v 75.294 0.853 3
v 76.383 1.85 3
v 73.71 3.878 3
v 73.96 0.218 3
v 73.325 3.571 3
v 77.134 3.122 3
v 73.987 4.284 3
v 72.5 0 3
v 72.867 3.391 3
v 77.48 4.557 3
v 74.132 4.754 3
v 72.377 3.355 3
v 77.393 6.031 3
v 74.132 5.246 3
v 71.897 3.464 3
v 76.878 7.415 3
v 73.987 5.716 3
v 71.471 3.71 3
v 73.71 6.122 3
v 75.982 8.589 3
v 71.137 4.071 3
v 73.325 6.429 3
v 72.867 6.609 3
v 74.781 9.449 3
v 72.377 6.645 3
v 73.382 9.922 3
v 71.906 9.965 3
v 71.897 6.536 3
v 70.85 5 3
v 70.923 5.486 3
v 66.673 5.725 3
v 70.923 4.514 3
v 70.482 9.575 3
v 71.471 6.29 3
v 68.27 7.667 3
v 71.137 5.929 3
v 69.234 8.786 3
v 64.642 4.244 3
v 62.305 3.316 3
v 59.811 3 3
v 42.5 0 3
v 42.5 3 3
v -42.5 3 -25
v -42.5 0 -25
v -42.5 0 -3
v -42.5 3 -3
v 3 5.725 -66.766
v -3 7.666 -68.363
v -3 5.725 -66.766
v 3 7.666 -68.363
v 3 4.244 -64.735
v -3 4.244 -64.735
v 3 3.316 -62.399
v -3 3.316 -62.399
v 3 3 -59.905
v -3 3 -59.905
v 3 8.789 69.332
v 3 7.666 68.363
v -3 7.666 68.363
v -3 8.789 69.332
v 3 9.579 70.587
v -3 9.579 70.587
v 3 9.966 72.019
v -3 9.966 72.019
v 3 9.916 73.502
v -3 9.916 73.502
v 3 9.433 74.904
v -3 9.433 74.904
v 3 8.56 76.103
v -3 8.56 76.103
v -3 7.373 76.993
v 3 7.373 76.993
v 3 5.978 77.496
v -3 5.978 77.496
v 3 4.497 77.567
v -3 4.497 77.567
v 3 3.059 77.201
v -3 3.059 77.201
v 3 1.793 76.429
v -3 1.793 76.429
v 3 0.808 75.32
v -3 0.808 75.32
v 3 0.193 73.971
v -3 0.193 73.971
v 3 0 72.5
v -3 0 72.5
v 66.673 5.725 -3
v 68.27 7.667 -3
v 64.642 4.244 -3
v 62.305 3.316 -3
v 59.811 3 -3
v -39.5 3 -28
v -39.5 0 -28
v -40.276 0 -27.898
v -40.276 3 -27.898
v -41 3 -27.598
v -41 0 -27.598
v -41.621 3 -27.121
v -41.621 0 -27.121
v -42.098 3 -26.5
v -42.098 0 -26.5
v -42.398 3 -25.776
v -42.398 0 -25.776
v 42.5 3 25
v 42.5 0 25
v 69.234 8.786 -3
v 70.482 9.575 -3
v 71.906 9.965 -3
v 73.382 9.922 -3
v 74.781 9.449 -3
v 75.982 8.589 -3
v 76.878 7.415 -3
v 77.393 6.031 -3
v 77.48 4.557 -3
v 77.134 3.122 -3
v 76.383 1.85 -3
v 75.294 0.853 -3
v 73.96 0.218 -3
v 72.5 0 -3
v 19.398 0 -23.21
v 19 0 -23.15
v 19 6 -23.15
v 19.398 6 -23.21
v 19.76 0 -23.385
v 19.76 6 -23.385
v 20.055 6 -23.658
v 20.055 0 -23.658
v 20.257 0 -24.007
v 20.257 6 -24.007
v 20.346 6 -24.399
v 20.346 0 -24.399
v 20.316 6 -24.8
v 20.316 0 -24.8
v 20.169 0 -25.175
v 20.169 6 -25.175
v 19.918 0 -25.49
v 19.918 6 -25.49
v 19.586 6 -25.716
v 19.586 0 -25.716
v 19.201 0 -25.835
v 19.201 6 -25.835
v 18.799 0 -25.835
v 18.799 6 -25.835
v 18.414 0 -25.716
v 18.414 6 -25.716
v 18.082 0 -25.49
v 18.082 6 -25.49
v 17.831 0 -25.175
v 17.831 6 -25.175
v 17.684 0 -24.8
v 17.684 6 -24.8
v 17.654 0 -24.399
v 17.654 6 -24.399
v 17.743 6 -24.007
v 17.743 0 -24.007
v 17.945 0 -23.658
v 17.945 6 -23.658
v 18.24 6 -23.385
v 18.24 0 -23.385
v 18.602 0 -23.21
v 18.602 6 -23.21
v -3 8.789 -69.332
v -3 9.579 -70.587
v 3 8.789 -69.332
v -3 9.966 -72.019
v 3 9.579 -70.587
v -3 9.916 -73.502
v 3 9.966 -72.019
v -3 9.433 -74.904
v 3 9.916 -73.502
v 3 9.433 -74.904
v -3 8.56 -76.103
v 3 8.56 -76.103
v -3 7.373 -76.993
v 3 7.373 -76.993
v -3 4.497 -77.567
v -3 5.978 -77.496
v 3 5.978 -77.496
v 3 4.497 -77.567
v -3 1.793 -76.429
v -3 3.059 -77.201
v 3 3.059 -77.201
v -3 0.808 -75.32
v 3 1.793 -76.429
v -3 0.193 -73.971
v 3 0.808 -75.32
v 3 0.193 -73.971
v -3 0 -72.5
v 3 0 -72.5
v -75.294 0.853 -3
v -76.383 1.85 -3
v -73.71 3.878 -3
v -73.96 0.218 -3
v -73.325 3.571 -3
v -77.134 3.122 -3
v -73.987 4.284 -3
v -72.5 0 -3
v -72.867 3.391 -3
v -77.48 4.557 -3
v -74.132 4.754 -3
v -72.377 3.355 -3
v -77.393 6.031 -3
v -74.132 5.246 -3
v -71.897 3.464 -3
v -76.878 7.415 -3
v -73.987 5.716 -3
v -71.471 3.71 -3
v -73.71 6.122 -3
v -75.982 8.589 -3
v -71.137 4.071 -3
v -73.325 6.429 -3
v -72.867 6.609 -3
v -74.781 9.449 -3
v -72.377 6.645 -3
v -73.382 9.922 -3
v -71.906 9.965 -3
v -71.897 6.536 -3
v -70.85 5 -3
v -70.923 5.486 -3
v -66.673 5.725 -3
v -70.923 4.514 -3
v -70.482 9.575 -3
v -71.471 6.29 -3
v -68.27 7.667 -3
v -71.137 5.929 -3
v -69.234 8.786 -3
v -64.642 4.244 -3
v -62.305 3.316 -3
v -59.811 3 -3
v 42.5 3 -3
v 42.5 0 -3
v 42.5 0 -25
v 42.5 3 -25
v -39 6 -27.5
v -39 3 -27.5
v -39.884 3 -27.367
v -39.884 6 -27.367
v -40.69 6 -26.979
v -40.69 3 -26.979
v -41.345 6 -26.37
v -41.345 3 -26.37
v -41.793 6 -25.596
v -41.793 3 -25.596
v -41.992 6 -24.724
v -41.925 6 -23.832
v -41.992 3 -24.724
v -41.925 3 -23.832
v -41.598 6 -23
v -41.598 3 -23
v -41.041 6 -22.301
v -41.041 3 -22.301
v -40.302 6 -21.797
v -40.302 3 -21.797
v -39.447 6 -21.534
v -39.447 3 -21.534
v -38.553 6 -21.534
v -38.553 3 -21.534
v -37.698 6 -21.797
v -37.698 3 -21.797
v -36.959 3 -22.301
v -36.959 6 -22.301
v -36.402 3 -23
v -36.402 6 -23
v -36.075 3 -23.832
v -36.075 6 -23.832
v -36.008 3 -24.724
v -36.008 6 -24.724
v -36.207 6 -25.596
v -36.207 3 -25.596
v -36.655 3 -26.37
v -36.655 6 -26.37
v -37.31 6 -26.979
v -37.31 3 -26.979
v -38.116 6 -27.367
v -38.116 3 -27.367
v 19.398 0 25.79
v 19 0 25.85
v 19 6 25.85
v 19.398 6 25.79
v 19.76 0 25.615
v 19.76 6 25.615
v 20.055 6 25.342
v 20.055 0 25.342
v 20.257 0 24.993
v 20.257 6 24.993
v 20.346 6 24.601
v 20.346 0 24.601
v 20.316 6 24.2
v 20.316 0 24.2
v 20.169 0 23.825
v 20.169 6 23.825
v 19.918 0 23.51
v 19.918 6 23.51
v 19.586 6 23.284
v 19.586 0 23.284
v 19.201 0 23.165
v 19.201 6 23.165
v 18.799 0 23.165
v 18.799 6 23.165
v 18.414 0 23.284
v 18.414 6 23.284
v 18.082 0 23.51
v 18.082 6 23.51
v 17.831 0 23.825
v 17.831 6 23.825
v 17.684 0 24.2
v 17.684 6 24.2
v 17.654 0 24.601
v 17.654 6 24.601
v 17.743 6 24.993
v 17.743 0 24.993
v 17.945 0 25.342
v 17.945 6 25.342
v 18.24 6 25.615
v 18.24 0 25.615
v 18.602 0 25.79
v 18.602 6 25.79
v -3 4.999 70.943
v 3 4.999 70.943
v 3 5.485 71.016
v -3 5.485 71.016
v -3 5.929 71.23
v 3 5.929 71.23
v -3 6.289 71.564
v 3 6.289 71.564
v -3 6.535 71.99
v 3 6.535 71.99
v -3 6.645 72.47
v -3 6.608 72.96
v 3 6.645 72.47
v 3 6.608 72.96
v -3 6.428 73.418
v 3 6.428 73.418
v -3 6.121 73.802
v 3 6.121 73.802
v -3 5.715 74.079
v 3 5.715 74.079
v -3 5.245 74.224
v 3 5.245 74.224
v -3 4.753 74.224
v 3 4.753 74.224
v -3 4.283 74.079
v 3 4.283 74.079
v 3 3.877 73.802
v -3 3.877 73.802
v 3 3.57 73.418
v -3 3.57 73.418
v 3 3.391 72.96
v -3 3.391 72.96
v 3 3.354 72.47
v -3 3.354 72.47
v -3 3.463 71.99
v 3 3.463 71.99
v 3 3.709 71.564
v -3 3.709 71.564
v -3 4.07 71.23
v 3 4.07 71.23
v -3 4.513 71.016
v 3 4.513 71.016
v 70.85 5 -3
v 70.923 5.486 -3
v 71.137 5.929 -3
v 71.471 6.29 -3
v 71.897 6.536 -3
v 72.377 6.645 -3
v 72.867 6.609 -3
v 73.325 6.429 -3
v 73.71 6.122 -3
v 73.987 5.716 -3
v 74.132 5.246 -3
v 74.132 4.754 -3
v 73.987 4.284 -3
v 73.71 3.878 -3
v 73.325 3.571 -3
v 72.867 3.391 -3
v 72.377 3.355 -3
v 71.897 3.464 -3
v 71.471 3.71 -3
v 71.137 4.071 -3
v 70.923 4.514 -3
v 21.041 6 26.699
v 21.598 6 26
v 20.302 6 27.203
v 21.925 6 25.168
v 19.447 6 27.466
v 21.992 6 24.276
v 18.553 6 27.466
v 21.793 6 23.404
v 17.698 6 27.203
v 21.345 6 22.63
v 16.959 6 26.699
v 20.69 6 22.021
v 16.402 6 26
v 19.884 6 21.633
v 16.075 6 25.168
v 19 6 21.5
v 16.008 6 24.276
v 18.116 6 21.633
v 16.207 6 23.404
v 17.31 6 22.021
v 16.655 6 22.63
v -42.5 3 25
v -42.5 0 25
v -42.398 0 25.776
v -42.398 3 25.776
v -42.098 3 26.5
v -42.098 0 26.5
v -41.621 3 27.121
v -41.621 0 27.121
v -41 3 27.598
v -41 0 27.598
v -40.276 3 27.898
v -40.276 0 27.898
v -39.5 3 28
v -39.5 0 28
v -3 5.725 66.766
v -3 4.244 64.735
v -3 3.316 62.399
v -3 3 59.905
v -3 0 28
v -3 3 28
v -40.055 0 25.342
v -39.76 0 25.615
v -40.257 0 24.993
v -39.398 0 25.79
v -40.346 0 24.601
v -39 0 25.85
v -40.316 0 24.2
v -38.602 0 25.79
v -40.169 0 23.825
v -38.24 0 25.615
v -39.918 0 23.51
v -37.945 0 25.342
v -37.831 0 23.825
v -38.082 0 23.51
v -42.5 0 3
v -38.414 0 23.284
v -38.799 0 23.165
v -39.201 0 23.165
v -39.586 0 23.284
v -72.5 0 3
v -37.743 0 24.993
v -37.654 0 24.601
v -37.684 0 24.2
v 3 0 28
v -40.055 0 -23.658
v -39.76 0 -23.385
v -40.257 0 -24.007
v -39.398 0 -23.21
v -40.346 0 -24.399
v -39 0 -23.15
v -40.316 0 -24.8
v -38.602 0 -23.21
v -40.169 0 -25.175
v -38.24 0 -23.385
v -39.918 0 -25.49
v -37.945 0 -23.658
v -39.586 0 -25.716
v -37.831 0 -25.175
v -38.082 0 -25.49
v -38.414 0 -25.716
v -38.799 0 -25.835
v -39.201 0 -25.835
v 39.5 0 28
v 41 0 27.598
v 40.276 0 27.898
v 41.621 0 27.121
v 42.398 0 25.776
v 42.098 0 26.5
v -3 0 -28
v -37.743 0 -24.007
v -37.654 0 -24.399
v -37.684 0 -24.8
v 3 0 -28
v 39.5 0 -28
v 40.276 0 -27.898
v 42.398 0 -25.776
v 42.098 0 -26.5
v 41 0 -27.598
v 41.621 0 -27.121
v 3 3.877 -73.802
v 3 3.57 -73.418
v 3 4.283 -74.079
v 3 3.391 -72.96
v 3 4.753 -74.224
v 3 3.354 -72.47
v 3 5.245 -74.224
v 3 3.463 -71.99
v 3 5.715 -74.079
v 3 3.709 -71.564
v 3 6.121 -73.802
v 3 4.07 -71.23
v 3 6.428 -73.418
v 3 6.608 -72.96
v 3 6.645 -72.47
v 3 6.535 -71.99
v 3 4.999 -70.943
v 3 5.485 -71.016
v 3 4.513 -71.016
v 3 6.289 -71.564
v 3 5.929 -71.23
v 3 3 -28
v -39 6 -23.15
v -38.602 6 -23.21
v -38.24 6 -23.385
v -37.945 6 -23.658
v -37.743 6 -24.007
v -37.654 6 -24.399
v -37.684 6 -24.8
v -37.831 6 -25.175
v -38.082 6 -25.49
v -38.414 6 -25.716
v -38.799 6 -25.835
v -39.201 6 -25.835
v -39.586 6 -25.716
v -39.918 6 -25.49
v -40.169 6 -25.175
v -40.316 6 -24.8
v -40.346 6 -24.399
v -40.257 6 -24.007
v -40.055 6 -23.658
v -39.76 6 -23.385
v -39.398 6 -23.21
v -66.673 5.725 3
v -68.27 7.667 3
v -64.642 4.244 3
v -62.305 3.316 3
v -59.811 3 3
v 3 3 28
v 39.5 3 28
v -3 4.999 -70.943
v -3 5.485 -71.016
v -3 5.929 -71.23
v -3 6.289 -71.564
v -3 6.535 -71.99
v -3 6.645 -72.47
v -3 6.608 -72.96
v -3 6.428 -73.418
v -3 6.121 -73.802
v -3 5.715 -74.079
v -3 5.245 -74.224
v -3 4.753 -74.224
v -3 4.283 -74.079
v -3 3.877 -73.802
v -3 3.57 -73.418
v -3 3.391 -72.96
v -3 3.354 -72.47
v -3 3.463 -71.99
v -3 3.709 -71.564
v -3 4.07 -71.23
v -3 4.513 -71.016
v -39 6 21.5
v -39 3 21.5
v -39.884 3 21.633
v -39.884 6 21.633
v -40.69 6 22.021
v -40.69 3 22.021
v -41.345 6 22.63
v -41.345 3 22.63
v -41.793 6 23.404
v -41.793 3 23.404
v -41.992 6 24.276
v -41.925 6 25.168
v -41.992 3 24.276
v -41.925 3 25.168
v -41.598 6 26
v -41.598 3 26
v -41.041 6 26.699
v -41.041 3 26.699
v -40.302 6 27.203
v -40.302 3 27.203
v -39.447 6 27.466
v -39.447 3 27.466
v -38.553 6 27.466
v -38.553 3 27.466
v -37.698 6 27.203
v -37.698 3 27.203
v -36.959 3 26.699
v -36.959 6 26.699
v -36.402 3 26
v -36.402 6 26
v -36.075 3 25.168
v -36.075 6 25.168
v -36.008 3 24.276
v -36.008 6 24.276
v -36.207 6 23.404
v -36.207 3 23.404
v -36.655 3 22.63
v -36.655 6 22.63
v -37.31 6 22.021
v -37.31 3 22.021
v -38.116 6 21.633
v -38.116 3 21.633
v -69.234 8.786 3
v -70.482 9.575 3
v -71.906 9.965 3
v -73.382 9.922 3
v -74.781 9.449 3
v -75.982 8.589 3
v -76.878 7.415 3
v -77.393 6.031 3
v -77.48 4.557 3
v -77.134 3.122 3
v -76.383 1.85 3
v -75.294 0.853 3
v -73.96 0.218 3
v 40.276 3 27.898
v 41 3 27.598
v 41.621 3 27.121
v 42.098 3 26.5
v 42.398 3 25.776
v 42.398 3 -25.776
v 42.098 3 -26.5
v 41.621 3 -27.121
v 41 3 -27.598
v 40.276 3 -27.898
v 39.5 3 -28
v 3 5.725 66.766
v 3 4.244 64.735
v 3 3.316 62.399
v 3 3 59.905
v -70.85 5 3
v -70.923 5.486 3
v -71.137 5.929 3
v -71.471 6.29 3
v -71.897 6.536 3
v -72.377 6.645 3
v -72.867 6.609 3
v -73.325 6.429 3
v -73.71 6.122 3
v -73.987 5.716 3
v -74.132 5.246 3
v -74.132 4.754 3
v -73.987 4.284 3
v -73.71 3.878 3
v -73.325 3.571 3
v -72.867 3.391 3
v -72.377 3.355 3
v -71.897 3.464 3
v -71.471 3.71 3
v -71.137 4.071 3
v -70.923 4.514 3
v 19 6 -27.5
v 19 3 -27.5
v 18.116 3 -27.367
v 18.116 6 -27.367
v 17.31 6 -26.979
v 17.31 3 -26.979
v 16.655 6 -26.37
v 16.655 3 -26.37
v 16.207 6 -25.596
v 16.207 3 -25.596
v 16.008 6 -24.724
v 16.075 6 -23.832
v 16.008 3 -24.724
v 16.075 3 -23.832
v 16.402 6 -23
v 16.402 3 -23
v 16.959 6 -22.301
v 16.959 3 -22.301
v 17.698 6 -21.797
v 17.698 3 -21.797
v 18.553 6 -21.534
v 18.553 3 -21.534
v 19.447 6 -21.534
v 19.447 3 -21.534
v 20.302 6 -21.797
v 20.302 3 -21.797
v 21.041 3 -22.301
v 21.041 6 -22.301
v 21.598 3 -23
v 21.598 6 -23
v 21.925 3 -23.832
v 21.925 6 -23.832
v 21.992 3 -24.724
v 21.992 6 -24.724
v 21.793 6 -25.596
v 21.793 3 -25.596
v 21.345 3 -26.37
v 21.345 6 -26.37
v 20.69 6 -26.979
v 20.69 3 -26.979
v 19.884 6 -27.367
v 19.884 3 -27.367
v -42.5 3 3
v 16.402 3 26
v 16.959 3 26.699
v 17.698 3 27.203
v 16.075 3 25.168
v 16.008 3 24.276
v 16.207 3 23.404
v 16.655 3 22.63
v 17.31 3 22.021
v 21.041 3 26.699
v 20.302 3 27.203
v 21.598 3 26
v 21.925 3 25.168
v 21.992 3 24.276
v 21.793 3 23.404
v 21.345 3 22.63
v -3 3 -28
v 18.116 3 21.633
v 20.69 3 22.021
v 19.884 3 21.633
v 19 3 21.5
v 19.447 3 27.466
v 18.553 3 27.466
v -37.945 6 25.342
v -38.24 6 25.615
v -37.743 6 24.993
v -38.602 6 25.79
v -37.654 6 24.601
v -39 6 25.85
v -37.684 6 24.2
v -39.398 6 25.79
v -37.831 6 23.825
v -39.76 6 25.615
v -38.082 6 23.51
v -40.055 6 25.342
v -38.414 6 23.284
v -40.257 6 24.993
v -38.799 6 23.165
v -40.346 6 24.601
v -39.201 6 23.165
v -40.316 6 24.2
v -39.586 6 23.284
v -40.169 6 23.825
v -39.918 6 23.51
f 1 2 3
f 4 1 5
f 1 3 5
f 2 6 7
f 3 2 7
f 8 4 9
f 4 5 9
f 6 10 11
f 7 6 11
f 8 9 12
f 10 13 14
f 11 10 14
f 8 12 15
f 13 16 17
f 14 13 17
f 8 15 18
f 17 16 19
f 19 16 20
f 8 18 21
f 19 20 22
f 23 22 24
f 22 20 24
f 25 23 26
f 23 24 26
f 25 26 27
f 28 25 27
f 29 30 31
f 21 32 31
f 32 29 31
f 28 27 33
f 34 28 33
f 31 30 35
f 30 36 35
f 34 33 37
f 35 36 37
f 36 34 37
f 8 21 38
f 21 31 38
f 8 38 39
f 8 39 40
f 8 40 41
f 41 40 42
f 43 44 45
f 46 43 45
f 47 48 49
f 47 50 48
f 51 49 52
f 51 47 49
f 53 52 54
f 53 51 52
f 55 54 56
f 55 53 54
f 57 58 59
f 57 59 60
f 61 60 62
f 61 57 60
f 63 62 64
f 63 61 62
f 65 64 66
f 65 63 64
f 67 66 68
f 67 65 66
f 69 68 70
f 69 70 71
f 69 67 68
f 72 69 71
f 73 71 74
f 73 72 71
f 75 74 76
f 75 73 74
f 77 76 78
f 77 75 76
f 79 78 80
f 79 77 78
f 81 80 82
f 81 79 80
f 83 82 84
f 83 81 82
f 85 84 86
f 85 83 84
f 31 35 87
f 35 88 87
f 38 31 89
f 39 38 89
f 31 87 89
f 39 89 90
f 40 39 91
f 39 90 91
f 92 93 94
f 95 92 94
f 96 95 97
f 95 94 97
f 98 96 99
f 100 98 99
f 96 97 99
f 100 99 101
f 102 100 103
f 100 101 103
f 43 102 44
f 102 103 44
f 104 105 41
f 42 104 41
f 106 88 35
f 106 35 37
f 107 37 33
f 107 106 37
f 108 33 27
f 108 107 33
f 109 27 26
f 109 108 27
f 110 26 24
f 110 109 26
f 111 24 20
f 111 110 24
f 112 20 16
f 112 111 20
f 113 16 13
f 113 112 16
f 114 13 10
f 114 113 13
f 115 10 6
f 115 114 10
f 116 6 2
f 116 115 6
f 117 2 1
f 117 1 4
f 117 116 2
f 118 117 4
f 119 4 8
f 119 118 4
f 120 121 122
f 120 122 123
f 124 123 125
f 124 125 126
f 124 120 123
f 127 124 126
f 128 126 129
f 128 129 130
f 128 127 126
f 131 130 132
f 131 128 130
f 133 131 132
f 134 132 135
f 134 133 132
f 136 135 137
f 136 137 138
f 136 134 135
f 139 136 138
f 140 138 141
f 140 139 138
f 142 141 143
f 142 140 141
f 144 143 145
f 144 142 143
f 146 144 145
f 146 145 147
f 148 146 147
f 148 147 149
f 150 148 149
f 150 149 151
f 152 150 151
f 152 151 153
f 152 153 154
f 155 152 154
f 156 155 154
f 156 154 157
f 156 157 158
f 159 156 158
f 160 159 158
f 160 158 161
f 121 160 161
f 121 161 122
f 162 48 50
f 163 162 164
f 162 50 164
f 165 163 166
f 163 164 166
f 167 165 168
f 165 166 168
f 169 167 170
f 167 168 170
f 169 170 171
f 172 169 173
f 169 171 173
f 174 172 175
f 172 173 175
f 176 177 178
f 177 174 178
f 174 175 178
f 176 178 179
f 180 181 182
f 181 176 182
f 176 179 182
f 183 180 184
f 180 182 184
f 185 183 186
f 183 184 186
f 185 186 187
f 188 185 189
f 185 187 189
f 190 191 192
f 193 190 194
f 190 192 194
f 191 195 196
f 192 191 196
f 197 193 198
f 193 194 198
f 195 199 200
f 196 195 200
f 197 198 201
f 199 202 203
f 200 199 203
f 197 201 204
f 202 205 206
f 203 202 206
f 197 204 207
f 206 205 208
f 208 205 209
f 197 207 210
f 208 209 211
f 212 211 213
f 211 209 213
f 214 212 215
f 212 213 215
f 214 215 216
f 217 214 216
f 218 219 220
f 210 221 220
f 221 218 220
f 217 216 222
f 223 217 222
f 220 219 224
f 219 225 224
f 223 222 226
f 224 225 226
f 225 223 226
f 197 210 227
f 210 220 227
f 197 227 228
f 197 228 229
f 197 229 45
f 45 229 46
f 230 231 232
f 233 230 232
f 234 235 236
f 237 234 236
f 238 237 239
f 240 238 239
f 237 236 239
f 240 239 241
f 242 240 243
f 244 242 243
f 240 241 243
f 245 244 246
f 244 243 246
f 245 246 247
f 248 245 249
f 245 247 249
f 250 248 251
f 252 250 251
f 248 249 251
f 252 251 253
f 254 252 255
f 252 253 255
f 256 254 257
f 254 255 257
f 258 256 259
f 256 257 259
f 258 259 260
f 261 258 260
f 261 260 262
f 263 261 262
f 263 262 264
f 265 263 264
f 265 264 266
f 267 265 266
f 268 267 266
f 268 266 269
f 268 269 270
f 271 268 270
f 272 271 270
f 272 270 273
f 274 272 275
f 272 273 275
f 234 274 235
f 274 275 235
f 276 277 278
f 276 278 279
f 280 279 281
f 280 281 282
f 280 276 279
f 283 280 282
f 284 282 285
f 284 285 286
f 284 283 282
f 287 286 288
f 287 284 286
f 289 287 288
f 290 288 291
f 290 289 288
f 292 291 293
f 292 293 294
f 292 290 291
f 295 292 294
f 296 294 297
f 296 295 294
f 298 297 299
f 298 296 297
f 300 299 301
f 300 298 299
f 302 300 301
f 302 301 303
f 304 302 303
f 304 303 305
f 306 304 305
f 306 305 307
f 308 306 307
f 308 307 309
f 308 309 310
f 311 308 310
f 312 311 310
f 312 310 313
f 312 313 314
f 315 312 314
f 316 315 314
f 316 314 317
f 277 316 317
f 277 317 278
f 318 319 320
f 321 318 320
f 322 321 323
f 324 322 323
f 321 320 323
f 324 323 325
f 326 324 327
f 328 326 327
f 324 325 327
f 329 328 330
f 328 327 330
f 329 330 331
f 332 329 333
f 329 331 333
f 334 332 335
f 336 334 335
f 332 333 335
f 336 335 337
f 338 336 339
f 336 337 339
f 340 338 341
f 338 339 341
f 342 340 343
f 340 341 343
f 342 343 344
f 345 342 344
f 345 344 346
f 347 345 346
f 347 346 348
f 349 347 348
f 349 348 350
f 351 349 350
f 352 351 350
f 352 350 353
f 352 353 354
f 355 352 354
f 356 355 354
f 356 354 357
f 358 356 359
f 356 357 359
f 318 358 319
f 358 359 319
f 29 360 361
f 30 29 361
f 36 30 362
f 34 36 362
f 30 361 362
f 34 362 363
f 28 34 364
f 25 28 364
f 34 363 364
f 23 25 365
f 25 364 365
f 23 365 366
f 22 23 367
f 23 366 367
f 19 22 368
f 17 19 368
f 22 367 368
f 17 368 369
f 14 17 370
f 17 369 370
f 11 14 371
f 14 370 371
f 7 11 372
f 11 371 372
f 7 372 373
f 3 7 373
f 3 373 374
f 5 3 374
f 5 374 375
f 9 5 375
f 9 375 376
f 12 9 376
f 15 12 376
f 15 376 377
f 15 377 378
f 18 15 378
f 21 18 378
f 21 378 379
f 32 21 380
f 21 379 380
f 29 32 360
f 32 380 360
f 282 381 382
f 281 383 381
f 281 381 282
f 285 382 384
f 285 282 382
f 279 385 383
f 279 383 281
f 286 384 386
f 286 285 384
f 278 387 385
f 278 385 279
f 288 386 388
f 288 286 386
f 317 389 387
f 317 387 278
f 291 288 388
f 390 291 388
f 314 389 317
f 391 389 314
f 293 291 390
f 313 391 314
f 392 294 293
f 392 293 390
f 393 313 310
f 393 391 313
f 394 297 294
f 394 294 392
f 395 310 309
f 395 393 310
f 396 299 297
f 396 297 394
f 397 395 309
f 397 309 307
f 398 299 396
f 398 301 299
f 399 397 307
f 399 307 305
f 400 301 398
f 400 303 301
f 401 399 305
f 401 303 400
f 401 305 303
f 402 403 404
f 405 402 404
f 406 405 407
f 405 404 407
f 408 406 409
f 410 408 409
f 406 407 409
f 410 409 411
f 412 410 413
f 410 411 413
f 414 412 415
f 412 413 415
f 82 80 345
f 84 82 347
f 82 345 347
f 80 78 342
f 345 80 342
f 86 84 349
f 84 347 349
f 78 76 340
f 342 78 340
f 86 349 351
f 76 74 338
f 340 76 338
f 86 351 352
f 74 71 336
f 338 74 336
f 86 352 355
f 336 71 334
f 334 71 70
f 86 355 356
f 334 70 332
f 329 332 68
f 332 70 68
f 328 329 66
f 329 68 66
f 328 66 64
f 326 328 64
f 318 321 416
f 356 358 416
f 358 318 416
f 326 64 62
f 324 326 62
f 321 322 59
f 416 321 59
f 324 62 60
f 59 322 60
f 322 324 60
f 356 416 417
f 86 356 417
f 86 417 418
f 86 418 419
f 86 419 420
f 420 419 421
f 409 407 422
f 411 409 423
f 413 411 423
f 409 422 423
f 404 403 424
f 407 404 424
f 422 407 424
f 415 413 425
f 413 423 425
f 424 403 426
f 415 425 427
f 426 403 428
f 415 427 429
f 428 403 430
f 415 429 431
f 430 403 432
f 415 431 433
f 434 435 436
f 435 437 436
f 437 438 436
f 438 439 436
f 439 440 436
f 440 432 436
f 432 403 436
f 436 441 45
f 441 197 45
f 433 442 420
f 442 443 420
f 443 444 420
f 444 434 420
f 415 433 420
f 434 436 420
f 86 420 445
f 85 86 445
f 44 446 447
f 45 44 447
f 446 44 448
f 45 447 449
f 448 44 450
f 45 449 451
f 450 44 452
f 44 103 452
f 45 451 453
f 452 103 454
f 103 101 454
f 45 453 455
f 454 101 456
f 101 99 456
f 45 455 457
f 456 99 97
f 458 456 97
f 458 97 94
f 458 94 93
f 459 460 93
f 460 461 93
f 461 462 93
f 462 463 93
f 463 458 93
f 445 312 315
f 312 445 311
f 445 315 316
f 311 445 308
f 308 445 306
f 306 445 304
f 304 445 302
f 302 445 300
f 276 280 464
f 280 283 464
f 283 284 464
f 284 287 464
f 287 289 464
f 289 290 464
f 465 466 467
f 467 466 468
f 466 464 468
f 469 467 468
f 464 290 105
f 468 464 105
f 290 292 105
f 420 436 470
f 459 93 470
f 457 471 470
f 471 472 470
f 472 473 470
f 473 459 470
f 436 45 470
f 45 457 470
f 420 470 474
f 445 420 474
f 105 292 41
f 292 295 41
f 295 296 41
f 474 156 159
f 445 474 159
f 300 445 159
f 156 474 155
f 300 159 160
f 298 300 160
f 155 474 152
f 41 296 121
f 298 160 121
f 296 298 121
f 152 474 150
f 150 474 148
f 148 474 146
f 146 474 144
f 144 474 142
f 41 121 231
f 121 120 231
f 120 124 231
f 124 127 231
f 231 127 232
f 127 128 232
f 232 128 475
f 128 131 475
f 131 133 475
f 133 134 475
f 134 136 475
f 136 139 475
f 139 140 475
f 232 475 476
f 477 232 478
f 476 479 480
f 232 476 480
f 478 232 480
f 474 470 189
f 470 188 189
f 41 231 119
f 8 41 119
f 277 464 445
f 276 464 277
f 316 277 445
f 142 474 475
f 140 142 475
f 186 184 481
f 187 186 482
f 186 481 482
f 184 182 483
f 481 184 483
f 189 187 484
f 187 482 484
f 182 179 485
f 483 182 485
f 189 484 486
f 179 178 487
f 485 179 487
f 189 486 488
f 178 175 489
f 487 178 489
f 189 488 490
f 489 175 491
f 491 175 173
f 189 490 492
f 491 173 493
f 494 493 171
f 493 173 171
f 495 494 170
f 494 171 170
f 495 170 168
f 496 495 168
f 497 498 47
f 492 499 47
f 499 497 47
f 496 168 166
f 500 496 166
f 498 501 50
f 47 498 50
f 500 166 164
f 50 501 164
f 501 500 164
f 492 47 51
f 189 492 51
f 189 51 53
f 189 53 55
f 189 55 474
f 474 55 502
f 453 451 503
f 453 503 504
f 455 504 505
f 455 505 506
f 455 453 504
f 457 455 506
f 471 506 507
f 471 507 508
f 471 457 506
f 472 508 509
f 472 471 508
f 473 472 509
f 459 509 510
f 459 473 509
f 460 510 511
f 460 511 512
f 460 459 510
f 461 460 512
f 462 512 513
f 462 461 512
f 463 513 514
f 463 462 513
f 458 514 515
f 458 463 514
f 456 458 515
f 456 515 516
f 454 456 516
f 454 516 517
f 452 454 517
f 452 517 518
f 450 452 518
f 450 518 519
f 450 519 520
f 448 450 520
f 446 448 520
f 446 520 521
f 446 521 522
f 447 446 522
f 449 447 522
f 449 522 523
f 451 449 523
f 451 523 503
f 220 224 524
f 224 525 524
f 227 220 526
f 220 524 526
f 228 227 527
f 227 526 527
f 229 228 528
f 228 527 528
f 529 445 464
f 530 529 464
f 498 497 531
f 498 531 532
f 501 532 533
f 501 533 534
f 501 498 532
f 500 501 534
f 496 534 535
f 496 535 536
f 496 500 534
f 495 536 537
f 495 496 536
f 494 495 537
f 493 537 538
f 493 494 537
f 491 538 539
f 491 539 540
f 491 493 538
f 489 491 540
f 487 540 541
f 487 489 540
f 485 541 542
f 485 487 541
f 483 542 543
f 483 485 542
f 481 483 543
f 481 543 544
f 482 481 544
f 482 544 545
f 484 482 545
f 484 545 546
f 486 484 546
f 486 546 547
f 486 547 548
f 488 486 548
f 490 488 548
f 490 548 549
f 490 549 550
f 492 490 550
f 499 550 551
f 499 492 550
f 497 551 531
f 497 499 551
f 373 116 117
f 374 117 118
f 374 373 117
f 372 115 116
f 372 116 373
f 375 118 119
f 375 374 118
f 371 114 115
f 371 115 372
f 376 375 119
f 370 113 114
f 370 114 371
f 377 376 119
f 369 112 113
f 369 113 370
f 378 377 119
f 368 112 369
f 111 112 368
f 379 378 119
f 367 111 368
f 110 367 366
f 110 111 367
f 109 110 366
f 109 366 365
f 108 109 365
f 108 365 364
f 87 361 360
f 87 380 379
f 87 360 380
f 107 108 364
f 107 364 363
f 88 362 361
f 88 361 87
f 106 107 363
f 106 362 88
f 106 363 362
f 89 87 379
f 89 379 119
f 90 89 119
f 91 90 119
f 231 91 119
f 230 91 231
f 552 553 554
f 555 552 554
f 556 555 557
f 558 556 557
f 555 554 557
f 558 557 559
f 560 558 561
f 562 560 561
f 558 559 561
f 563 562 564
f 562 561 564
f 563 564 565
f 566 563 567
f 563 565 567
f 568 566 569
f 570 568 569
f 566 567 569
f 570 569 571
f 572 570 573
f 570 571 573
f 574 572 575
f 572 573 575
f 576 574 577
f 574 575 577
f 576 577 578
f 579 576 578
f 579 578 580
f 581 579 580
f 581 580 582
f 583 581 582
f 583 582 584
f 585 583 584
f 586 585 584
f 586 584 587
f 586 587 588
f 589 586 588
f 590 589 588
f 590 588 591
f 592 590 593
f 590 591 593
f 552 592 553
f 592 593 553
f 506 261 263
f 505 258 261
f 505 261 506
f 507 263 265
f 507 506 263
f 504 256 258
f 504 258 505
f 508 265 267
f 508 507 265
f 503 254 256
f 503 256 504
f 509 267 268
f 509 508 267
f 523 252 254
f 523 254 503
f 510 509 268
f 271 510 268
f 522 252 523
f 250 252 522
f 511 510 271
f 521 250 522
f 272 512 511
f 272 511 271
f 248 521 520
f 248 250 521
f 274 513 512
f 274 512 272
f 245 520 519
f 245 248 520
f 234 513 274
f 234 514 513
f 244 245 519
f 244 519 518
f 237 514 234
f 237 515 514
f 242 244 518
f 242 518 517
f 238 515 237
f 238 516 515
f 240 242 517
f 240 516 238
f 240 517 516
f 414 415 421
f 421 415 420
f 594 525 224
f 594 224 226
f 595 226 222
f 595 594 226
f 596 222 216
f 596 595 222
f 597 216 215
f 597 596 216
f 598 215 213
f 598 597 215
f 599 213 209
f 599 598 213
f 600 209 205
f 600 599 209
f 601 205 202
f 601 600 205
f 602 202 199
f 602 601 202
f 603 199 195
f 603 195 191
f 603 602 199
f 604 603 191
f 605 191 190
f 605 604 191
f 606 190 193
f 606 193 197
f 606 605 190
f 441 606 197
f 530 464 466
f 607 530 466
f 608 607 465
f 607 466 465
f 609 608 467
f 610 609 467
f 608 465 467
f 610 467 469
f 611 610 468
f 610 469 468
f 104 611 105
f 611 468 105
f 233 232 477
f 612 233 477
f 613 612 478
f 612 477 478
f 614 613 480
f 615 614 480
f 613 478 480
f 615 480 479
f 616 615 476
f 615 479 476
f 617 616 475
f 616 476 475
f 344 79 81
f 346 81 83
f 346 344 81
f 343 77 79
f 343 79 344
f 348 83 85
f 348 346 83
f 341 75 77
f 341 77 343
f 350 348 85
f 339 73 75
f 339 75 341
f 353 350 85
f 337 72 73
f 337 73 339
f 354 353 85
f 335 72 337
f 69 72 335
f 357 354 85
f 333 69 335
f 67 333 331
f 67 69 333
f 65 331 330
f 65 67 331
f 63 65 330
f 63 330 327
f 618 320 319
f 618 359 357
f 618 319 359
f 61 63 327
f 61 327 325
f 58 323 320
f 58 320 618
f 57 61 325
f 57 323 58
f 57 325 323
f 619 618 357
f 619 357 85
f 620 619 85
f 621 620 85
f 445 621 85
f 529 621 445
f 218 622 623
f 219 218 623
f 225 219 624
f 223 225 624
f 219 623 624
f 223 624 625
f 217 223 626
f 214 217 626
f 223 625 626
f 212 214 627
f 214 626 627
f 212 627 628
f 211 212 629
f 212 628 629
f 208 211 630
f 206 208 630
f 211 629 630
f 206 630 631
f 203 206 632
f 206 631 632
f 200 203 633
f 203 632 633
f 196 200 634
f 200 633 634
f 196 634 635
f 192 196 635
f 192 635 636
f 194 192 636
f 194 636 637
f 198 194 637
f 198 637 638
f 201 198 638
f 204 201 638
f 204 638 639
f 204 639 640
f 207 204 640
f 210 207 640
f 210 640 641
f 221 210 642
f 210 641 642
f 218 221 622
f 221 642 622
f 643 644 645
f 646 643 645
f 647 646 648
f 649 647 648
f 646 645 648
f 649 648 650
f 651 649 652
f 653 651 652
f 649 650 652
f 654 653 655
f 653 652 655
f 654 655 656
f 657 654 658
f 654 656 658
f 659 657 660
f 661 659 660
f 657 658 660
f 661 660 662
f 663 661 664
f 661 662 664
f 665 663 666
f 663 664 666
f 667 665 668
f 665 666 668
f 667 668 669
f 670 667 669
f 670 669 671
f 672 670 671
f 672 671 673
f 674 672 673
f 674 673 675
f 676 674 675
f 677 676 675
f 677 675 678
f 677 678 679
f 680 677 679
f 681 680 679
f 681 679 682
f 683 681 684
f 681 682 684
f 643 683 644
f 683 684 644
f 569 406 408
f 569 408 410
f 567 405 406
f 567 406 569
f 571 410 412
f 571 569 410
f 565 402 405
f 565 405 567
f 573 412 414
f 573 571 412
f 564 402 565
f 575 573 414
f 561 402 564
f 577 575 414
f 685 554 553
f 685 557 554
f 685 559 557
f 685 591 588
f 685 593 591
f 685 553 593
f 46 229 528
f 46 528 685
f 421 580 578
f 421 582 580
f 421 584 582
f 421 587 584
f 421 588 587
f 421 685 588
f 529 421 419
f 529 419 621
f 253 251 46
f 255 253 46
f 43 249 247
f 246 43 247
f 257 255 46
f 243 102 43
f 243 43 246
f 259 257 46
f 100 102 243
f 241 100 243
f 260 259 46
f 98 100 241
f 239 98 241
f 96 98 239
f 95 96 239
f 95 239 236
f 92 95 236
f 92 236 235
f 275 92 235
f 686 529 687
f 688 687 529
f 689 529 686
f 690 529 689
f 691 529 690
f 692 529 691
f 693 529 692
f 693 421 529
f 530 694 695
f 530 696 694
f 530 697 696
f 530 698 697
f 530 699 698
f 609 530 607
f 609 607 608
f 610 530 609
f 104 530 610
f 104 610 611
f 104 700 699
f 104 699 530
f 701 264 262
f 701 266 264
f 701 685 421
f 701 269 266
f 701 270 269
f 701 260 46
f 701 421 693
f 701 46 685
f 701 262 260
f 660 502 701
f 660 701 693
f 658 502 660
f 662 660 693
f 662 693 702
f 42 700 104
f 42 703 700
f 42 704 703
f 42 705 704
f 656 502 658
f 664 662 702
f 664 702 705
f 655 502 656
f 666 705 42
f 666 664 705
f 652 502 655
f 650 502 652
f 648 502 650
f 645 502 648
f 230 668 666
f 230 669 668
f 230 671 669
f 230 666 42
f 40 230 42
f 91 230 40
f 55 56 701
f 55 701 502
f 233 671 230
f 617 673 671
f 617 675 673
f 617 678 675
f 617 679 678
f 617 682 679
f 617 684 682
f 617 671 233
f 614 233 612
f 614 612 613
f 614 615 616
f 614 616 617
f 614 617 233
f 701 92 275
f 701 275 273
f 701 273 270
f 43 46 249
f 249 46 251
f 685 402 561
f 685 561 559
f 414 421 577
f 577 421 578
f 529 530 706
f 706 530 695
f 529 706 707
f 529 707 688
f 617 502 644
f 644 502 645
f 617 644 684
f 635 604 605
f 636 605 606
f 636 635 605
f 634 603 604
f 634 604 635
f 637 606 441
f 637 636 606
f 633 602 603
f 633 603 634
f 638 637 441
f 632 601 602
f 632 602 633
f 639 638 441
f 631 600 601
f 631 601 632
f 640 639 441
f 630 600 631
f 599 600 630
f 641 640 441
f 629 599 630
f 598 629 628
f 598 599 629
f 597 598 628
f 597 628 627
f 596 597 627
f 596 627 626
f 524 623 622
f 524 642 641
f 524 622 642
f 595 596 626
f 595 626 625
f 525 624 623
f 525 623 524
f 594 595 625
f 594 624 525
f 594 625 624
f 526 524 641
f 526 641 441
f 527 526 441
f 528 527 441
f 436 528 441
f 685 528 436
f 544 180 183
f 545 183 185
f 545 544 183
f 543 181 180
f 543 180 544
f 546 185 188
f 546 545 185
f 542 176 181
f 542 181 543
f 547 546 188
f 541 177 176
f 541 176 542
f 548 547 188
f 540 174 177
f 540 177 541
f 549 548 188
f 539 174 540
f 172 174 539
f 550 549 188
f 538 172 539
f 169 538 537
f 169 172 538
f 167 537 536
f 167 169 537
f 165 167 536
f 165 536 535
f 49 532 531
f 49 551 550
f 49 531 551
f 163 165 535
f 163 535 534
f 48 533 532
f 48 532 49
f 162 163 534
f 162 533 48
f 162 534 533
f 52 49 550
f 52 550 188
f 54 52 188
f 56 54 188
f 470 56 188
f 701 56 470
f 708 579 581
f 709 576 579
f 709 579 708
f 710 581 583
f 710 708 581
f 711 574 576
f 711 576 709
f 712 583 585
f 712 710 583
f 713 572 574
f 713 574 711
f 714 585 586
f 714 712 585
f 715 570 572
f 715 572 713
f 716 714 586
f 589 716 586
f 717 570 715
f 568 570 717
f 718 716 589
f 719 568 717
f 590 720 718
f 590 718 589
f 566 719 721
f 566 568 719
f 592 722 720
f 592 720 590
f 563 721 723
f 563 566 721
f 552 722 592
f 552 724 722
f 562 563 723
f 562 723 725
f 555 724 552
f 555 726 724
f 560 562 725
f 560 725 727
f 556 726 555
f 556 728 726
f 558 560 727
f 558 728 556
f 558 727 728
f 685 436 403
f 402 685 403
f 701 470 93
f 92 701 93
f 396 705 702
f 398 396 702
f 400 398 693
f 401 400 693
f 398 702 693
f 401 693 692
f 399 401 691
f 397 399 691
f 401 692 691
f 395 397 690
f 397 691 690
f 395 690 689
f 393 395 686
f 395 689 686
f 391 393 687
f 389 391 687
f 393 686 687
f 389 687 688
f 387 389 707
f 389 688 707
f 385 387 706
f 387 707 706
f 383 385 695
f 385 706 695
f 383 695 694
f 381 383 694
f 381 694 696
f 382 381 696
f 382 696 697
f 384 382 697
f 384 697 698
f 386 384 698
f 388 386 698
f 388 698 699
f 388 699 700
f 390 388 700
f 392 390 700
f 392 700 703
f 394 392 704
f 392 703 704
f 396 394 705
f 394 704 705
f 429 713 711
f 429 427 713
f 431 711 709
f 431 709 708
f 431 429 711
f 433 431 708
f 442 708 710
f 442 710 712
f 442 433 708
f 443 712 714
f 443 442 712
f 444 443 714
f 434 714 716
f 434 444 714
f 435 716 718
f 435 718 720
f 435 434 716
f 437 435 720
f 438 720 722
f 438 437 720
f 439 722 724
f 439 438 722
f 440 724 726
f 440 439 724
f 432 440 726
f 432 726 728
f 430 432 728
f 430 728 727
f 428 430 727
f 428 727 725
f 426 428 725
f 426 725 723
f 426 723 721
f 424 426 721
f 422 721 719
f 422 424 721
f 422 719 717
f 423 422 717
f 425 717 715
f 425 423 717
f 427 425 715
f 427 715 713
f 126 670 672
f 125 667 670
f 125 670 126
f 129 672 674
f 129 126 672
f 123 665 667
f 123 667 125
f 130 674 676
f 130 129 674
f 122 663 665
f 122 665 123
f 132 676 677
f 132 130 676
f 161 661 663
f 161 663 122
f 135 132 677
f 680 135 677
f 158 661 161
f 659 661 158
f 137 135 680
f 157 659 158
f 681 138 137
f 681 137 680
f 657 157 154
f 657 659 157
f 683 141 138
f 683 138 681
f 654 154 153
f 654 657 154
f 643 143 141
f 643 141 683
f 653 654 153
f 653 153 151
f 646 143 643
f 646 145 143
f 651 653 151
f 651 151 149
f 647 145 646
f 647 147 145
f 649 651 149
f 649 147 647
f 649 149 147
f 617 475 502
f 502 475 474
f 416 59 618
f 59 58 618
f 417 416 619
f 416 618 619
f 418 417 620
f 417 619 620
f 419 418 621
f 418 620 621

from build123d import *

# Parameters (mm, degrees)
SKETCH1_R                = 1.35
BOSS_EXTRUDE1_DEPTH      = 3
BOSS_EXTRUDE3_DEPTH      = 3
SKETCH2_R                = 3
SKETCH2_R_2              = 1.35
BOSS_EXTRUDE2_DEPTH      = 3
SKETCH4_R                = 5
SKETCH4_R_2              = 1.65
BOSS_EXTRUDE4_DEPTH      = 6
FILLET1_R                = 10
SKETCH6_R                = 5
SKETCH6_R_2              = 1.65
BOSS_EXTRUDE5_DEPTH      = 6
FILLET2_R                = 10
CIRPATTERN4_COUNT        = 2
FILLET1_OF_CIRPATTERN4_R = 10
FILLET2_OF_MIRROR1_R     = 10


with BuildPart() as part:
    # Sketch1 → Boss-Extrude1 (new body)
    with BuildSketch(Plane(origin=(0, 0, 0), x_dir=(1, 0, 0), z_dir=(0, 1, 0))):
        with BuildLine():
            Line((-39.5, -28), (39.5, -28))
            ThreePointArc((39.5, -28), (41.621320344, -27.121320344), (42.5, -25))
            Line((42.5, -25), (42.5, 25))
            ThreePointArc((42.5, 25), (41.621320344, 27.121320344), (39.5, 28))
            Line((39.5, 28), (-39.5, 28))
            ThreePointArc((-39.5, 28), (-41.621320344, 27.121320344), (-42.5, 25))
            Line((-42.5, 25), (-42.5, -25))
            ThreePointArc((-42.5, -25), (-41.621320344, -27.121320344), (-39.5, -28))
        make_face()
        with Locations(Location((-39, -24.5, 0), (0, 0, 270))):
            Circle(SKETCH1_R, mode=Mode.SUBTRACT)
        with Locations(Location((-39, 24.5, 0), (0, 0, 270))):
            Circle(SKETCH1_R, mode=Mode.SUBTRACT)
        with Locations(Location((19, 24.5, 0), (0, 0, 270))):
            Circle(SKETCH1_R, mode=Mode.SUBTRACT)
        with Locations(Location((19, -24.5, 0), (0, 0, 270))):
            Circle(SKETCH1_R, mode=Mode.SUBTRACT)
    extrude(amount=BOSS_EXTRUDE1_DEPTH)

    # Sketch3 → Boss-Extrude3 (add)
    with BuildSketch(Plane(origin=(0, 3, 0), x_dir=(1, 0, 0), z_dir=(0, 1, 0))):
        Polygon((-3, 3), (-72.5, 3), (-72.5, -3), (-3, -3), (-3, -72.5), (3, -72.5), (3, -3), (72.5, -3), (72.5, 3), (3, 3), (3, 72.5), (-3, 72.5), align=None)
    boss_extrude3 = extrude(amount=-BOSS_EXTRUDE3_DEPTH)

    # Sketch2 → Boss-Extrude2 (add)
    # profile 1 of 4: a face of its own
    with BuildSketch(Plane(origin=(0, 3, 0), x_dir=(1, 0, 0), z_dir=(0, 1, 0))):
        with Locations(Location((-39, -24.5, 0), (0, 0, 90))):
            Circle(SKETCH2_R)
        with Locations(Location((-39, -24.5, 0), (0, 0, 270))):
            Circle(SKETCH2_R_2, mode=Mode.SUBTRACT)
    # profile 2 of 4: a face of its own
    with BuildSketch(Plane(origin=(0, 3, 0), x_dir=(1, 0, 0), z_dir=(0, 1, 0))):
        with Locations(Location((-39, 24.5, 0), (0, 0, 90))):
            Circle(SKETCH2_R)
        with Locations(Location((-39, 24.5, 0), (0, 0, 270))):
            Circle(SKETCH2_R_2, mode=Mode.SUBTRACT)
    # profile 3 of 4: a face of its own
    with BuildSketch(Plane(origin=(0, 3, 0), x_dir=(1, 0, 0), z_dir=(0, 1, 0))):
        with Locations(Location((19, 24.5, 0), (0, 0, 90))):
            Circle(SKETCH2_R)
        with Locations(Location((19, 24.5, 0), (0, 0, 270))):
            Circle(SKETCH2_R_2, mode=Mode.SUBTRACT)
    # profile 4 of 4: a face of its own
    with BuildSketch(Plane(origin=(0, 3, 0), x_dir=(1, 0, 0), z_dir=(0, 1, 0))):
        with Locations(Location((19, -24.5, 0), (0, 0, 90))):
            Circle(SKETCH2_R)
        with Locations(Location((19, -24.5, 0), (0, 0, 270))):
            Circle(SKETCH2_R_2, mode=Mode.SUBTRACT)
    extrude(amount=BOSS_EXTRUDE2_DEPTH)

    # Sketch4 → Boss-Extrude4 (add)
    with BuildSketch(Plane.XY.offset(3)):
        with Locations((-72.5, 5)):
            Circle(SKETCH4_R)
        with Locations((-72.5, 5)):
            Circle(SKETCH4_R_2, mode=Mode.SUBTRACT)
    boss_extrude4 = extrude(amount=-BOSS_EXTRUDE4_DEPTH)

    # Fillet1
    fillet1_edges = [part.edges().sort_by_distance(p)[0] for p in [
        (-67.917424305, 3, 0),
    ]]
    fillet(fillet1_edges, radius=FILLET1_R)

    # Sketch6 → Boss-Extrude5 (add)
    with BuildSketch(Plane(origin=(3, 0, 0), x_dir=(0, 0, -1), z_dir=(1, 0, 0))):
        with Locations((-72.592807544, 4.999138602)):
            Circle(SKETCH6_R)
        with Locations((-72.592807544, 4.999138602)):
            Circle(SKETCH6_R_2, mode=Mode.SUBTRACT)
    boss_extrude5 = extrude(amount=-BOSS_EXTRUDE5_DEPTH)

    # Fillet2
    fillet2_edges = [part.edges().sort_by_distance(p)[0] for p in [
        (0, 3, 68.009856001),
    ]]
    fillet(fillet2_edges, radius=FILLET2_R)

    # CirPattern4: Boss-Extrude3, Boss-Extrude4 ×2 about axis
    cirpattern4_axis = Axis((0, 0, 0), (0, 1, 0))
    add([boss_extrude3.rotate(cirpattern4_axis, i * 360 / CIRPATTERN4_COUNT) for i in range(1, CIRPATTERN4_COUNT)])
    add([boss_extrude4.rotate(cirpattern4_axis, i * 360 / CIRPATTERN4_COUNT) for i in range(1, CIRPATTERN4_COUNT)])

    # Fillet1 of CirPattern4
    fillet1_of_cirpattern4_edges = [part.edges().sort_by_distance(p)[0] for p in [
        (67.917424305, 3, 0),
    ]]
    fillet(fillet1_of_cirpattern4_edges, radius=FILLET1_OF_CIRPATTERN4_R)

    # Mirror1: Boss-Extrude5 across plane
    add(boss_extrude5.mirror(Plane.XY))

    # Fillet2 of Mirror1
    fillet2_of_mirror1_edges = [part.edges().sort_by_distance(p)[0] for p in [
        (0, 3, -68.009856001),
    ]]
    fillet(fillet2_of_mirror1_edges, radius=FILLET2_OF_MIRROR1_R)


solid = part.part
